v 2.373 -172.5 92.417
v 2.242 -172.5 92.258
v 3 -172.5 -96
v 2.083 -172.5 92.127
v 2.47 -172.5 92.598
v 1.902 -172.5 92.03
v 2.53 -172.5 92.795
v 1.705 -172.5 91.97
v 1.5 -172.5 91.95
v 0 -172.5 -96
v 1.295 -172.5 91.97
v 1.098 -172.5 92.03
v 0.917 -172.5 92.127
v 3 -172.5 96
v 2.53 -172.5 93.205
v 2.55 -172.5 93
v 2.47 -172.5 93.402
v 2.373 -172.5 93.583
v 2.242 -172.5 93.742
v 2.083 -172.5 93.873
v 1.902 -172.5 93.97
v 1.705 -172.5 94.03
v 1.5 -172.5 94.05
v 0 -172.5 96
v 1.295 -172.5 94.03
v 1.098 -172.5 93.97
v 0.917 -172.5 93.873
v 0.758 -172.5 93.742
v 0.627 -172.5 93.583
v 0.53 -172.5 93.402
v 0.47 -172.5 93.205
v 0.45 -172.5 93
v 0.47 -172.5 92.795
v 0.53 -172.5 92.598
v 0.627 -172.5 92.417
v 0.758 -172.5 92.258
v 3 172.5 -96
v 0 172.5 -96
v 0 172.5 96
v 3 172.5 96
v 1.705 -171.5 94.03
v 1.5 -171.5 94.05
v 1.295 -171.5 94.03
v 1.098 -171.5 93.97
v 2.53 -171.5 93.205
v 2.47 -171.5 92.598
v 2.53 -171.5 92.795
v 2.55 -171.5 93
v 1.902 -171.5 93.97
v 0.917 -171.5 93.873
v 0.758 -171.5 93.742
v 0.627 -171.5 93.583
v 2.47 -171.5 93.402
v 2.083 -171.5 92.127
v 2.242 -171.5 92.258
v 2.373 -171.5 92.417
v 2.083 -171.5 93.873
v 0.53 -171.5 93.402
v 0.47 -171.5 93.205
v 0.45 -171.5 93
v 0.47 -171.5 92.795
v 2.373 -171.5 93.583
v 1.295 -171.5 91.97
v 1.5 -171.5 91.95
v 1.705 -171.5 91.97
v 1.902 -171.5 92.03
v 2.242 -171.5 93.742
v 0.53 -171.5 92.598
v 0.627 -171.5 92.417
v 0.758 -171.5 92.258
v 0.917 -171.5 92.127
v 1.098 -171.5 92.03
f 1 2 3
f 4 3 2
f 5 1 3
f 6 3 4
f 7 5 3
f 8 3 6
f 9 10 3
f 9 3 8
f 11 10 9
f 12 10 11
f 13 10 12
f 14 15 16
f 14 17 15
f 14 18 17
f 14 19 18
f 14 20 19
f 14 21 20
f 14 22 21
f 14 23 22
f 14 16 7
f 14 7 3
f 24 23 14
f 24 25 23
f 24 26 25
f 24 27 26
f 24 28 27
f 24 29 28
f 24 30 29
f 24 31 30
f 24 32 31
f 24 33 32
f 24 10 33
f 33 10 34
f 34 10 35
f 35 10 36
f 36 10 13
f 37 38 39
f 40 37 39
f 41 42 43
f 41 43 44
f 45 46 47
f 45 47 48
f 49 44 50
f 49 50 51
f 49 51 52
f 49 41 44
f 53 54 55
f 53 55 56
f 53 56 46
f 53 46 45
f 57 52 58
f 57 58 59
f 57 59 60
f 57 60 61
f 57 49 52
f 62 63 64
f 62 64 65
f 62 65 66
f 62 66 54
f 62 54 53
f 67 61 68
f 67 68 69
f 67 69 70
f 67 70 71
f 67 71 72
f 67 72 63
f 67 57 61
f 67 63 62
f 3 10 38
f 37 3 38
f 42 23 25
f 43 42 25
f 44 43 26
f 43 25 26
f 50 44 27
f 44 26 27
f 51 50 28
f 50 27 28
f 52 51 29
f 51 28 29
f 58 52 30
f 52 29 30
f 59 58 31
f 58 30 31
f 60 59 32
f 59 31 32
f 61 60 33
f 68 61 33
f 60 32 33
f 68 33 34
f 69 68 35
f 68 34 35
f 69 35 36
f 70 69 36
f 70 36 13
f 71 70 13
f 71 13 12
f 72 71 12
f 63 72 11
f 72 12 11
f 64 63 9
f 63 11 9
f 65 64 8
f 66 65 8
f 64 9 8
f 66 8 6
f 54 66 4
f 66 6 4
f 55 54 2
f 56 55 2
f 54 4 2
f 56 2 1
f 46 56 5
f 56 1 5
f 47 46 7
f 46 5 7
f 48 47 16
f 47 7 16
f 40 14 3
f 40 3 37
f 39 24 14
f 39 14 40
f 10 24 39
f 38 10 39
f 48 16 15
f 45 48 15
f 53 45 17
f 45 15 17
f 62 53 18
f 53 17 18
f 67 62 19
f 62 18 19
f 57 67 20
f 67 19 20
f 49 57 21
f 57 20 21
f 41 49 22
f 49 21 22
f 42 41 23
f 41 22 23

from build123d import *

# Parameters (mm, degrees)
F0_W     = 345
F0_H     = 192
F1_DEPTH = 3
F3_DEPTH = 1


with BuildPart() as f1:
    # F0 (on Right) → F1 (new body)
    with BuildSketch(Plane.YZ):
        Rectangle(F0_W, F0_H)
    extrude(amount=F1_DEPTH)

    # F2 (on face) → F3 (cut)
    with BuildSketch(Plane.XZ.offset(172.5)):
        with BuildLine():
            ThreePointArc((2.55, 93), (2.242462, 93.742462), (1.5, 94.05))
            ThreePointArc((1.5, 94.05), (0.757538, 92.257538), (2.55, 93))
        make_face()
    extrude(amount=-F3_DEPTH, mode=Mode.SUBTRACT)


solid = f1.part
